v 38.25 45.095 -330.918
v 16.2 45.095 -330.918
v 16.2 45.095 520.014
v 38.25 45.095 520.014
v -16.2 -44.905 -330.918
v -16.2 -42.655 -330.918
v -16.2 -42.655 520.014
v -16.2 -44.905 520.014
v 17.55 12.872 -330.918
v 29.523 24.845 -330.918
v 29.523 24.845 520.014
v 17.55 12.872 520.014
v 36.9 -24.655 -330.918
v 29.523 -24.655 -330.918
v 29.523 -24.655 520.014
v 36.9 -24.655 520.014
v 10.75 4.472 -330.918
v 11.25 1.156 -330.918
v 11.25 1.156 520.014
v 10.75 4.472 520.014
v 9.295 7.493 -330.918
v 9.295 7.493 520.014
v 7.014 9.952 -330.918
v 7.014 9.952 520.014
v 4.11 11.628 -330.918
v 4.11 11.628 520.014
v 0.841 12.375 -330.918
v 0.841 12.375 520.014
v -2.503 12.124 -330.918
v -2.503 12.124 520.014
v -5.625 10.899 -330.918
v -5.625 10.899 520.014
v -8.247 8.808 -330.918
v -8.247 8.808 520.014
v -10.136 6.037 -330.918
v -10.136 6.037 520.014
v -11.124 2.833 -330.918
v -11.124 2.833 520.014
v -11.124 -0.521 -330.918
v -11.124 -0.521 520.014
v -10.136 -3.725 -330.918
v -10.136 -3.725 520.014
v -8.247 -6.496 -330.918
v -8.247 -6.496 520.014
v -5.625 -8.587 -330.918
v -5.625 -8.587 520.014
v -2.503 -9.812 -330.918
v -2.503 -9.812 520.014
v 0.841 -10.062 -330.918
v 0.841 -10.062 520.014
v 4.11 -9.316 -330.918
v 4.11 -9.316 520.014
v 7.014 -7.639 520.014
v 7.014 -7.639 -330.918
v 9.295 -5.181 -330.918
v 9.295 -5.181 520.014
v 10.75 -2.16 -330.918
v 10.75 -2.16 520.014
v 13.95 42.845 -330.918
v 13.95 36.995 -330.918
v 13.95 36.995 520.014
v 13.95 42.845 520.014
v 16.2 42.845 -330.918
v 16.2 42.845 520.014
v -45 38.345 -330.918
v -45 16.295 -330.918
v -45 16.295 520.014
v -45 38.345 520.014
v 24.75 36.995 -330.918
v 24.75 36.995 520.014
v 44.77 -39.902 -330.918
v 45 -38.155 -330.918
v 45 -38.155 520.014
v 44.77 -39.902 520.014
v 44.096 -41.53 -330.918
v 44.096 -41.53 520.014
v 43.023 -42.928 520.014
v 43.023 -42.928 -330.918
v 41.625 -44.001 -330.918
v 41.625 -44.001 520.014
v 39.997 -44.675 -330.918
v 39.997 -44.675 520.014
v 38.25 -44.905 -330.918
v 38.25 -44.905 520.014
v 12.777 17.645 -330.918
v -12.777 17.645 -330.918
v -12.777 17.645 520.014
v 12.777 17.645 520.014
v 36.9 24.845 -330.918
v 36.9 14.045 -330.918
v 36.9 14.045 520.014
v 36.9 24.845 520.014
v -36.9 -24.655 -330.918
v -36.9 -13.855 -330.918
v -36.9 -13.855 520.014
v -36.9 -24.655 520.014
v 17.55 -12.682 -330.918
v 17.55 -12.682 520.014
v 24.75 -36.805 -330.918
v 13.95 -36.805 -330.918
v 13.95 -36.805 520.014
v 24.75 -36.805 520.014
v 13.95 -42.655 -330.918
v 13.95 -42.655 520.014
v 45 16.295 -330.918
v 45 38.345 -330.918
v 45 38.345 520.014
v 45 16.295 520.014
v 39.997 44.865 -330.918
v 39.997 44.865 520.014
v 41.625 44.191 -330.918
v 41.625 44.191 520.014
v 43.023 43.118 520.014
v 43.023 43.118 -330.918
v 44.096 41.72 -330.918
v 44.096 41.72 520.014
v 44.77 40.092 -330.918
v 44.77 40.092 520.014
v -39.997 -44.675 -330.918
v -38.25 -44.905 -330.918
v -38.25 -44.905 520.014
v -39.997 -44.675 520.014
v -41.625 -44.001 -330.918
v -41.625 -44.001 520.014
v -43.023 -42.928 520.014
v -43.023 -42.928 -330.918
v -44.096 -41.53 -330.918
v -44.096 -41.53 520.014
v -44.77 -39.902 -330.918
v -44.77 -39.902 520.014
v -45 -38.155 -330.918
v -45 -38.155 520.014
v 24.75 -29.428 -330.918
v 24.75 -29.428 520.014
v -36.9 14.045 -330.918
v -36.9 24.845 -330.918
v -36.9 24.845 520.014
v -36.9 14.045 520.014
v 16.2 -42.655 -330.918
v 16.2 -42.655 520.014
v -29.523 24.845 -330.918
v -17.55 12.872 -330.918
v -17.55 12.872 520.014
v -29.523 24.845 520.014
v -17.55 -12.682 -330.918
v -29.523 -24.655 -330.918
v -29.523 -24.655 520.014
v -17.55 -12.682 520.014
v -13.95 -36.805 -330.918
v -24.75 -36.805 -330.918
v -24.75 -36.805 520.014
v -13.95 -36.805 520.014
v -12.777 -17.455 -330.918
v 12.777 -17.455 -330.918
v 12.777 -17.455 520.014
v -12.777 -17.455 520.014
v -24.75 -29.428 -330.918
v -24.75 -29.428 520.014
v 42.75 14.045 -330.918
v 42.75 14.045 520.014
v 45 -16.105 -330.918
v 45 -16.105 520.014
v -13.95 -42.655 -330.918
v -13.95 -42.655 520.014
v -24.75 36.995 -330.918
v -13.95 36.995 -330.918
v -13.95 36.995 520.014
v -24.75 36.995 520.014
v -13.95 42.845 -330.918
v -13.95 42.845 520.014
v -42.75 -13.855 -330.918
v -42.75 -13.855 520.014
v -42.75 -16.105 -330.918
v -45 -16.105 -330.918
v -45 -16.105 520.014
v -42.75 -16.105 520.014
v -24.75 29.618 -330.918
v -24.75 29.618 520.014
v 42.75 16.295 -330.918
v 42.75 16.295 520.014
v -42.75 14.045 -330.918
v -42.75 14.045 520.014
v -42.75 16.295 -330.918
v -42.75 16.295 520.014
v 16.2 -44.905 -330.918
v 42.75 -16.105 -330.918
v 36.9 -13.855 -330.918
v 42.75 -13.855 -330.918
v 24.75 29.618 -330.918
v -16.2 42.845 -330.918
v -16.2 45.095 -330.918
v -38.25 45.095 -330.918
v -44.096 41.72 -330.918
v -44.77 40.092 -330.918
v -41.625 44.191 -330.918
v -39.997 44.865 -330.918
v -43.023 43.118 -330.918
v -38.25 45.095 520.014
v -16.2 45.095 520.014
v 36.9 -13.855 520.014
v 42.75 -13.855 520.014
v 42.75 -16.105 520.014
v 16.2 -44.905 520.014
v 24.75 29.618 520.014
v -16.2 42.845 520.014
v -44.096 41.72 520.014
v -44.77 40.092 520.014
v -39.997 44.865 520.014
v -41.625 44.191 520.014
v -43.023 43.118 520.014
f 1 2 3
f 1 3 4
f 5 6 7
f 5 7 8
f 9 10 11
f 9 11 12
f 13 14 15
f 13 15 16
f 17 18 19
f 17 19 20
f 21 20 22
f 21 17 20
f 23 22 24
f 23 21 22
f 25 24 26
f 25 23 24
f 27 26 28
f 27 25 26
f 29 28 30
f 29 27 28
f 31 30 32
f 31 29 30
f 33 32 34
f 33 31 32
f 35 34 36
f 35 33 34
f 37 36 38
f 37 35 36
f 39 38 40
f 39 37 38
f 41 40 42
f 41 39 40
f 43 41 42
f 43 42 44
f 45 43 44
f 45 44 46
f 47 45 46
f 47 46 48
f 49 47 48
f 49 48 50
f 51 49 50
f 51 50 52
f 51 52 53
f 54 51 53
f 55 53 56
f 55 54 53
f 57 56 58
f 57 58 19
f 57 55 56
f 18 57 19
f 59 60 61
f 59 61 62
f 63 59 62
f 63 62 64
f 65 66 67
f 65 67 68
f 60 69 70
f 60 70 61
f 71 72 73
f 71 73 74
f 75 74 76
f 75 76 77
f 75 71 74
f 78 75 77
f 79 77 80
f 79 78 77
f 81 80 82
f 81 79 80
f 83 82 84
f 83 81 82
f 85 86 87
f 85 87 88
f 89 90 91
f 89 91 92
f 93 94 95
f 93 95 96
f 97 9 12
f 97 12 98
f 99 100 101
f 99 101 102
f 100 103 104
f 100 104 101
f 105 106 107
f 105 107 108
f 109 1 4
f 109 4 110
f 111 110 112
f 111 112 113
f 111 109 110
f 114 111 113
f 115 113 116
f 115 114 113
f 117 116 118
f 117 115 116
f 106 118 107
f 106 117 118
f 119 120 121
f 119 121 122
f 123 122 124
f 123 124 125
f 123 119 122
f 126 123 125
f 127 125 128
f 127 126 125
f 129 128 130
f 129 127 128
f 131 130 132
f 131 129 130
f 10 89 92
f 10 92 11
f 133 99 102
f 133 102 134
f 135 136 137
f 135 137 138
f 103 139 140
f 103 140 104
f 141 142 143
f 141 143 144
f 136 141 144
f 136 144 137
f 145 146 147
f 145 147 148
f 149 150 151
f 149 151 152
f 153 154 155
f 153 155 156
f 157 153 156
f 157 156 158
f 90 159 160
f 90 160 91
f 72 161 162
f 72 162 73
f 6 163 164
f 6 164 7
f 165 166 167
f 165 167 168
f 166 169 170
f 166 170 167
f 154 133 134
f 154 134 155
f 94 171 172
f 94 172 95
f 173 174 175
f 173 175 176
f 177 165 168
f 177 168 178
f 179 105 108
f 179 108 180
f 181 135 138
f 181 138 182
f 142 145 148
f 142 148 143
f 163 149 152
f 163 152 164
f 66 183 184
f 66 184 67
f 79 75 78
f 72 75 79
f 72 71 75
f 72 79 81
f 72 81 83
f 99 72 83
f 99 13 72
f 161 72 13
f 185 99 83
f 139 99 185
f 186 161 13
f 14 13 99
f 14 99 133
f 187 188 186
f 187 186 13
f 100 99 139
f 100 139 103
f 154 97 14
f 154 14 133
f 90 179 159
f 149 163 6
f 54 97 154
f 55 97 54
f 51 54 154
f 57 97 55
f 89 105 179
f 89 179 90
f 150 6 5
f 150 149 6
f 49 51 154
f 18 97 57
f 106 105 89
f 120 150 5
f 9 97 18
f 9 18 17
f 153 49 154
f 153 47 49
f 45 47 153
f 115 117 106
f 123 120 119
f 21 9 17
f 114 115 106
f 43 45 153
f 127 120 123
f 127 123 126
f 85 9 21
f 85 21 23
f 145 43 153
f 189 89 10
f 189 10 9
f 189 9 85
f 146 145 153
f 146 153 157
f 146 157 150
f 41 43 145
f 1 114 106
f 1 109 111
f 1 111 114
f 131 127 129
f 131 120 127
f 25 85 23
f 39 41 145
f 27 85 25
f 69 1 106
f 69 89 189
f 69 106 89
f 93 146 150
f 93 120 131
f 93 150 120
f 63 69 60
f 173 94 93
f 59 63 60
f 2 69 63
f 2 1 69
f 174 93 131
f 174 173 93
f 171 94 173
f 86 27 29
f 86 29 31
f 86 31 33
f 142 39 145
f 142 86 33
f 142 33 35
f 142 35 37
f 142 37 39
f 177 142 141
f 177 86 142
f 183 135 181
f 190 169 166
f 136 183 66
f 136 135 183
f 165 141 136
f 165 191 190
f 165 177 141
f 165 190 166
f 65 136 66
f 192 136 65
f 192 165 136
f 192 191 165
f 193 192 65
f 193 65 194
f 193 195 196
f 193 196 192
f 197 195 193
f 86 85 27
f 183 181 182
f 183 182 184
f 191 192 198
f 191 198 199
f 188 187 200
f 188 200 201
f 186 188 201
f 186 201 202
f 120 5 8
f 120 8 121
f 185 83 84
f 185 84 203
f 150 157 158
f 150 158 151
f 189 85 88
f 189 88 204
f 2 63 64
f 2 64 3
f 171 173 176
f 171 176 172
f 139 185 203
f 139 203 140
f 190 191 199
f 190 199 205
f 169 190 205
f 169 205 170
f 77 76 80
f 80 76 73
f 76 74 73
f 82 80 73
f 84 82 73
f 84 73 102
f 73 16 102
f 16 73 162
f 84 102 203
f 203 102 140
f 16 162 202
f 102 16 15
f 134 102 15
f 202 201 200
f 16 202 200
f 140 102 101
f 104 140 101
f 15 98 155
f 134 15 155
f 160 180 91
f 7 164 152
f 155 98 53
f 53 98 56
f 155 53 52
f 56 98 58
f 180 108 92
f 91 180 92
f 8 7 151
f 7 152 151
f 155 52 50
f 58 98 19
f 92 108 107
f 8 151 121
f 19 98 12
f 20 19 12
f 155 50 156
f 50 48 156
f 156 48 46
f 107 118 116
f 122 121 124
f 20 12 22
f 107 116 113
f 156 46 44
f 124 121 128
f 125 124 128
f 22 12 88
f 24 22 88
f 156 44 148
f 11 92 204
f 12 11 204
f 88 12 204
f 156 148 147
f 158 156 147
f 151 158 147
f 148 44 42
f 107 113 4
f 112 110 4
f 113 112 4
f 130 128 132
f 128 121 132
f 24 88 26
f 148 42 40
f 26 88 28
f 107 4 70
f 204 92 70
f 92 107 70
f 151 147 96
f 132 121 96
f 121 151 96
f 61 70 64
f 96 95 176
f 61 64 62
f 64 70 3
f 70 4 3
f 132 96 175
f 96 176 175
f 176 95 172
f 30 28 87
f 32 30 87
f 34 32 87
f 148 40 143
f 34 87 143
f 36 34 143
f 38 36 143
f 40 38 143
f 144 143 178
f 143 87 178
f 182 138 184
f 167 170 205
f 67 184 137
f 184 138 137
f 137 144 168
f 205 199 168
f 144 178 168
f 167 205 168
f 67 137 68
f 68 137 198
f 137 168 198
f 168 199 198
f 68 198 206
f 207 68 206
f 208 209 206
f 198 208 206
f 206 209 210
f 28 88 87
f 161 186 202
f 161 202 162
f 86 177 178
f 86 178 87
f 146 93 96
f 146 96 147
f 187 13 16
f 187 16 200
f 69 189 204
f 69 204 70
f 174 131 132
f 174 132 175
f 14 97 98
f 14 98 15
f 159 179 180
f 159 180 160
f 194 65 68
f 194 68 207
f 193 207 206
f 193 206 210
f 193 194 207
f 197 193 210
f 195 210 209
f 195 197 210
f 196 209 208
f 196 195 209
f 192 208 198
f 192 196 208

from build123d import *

# Parameters (mm, degrees)
SKETCH1_R           = 2.5
BOSS_EXTRUDE1_DEPTH = 189.096108091
SCALE_2_SCALE       = 3
SCALE_3_SCALE       = 6
SCALE_5_SCALE       = 2
SCALE_6_SCALE       = 0.25
SCALE_7_SCALE       = 0.125
SCALE_8_SCALE       = 0.25
SCALE_9_SCALE       = 4
SCALE_10_SCALE      = 4


with BuildPart() as part:
    # Sketch1 → Boss-Extrude1 (new body)
    with BuildSketch(Plane.XY):
        with BuildLine():
            Line((2.839339828, 3.9), (5.5, 6.560660172))
            Line((5.5, 6.560660172), (5.5, 8.2))
            Line((5.5, 8.2), (3.1, 8.2))
            Line((3.1, 8.2), (3.1, 9.5))
            Line((3.1, 9.5), (3.6, 9.5))
            Line((3.6, 9.5), (3.6, 10))
            Line((3.6, 10), (8.5, 10))
            ThreePointArc((8.5, 10), (9.560660172, 9.560660172), (10, 8.5))
            Line((10, 8.5), (10, 3.6))
            Line((10, 3.6), (9.5, 3.6))
            Line((9.5, 3.6), (9.5, 3.1))
            Line((9.5, 3.1), (8.2, 3.1))
            Line((8.2, 3.1), (8.2, 5.5))
            Line((8.2, 5.5), (6.560660172, 5.5))
            Line((6.560660172, 5.5), (3.9, 2.839339828))
            Line((3.9, 2.839339828), (3.9, -2.839339828))
            Line((3.9, -2.839339828), (6.560660172, -5.5))
            Line((6.560660172, -5.5), (8.2, -5.5))
            Line((8.2, -5.5), (8.2, -3.1))
            Line((8.2, -3.1), (9.5, -3.1))
            Line((9.5, -3.1), (9.5, -3.6))
            Line((9.5, -3.6), (10, -3.6))
            Line((10, -3.6), (10, -8.5))
            ThreePointArc((10, -8.5), (9.560660172, -9.560660172), (8.5, -10))
            Line((8.5, -10), (3.6, -10))
            Line((3.6, -10), (3.6, -9.5))
            Line((3.6, -9.5), (3.1, -9.5))
            Line((3.1, -9.5), (3.1, -8.2))
            Line((3.1, -8.2), (5.5, -8.2))
            Line((5.5, -8.2), (5.5, -6.560660172))
            Line((5.5, -6.560660172), (2.839339828, -3.9))
            Line((2.839339828, -3.9), (-2.839339828, -3.9))
            Line((-2.839339828, -3.9), (-5.5, -6.560660172))
            Line((-5.5, -6.560660172), (-5.5, -8.2))
            Line((-5.5, -8.2), (-3.1, -8.2))
            Line((-3.1, -8.2), (-3.1, -9.5))
            Line((-3.1, -9.5), (-3.6, -9.5))
            Line((-3.6, -9.5), (-3.6, -10))
            Line((-3.6, -10), (-8.5, -10))
            ThreePointArc((-8.5, -10), (-9.560660172, -9.560660172), (-10, -8.5))
            Line((-10, -8.5), (-10, -3.6))
            Line((-10, -3.6), (-9.5, -3.6))
            Line((-9.5, -3.6), (-9.5, -3.1))
            Line((-9.5, -3.1), (-8.2, -3.1))
            Line((-8.2, -3.1), (-8.2, -5.5))
            Line((-8.2, -5.5), (-6.560660172, -5.5))
            Line((-6.560660172, -5.5), (-3.9, -2.839339828))
            Line((-3.9, -2.839339828), (-3.9, 2.839339828))
            Line((-3.9, 2.839339828), (-6.560660172, 5.5))
            Line((-6.560660172, 5.5), (-8.2, 5.5))
            Line((-8.2, 5.5), (-8.2, 3.1))
            Line((-8.2, 3.1), (-9.5, 3.1))
            Line((-9.5, 3.1), (-9.5, 3.6))
            Line((-9.5, 3.6), (-10, 3.6))
            Line((-10, 3.6), (-10, 8.5))
            ThreePointArc((-10, 8.5), (-9.560660172, 9.560660172), (-8.5, 10))
            Line((-8.5, 10), (-3.6, 10))
            Line((-3.6, 10), (-3.6, 9.5))
            Line((-3.6, 9.5), (-3.1, 9.5))
            Line((-3.1, 9.5), (-3.1, 8.2))
            Line((-3.1, 8.2), (-5.5, 8.2))
            Line((-5.5, 8.2), (-5.5, 6.560660172))
            Line((-5.5, 6.560660172), (-2.839339828, 3.9))
            Line((-2.839339828, 3.9), (2.839339828, 3.9))
        make_face()
        with Locations((0, 0.235847297)):
            Circle(SKETCH1_R, mode=Mode.SUBTRACT)
    extrude(amount=BOSS_EXTRUDE1_DEPTH)


with BuildPart() as part_1:
    # 缩放比例2: scaled about (0, -0.027095247, 94.548054046)
    add(part.part.scale(SCALE_2_SCALE).moved(Location((0, 0.054190494, -189.096108092))))


with BuildPart() as part_2:
    # 缩放比例3: scaled about (0, -0.027095247, 94.548054045)
    add(part_1.part.scale(SCALE_3_SCALE).moved(Location((0, 0.135476235, -472.740270225))))


with BuildPart() as part_3:
    # 缩放比例5: scaled about (0, -0.027095249, 94.548054043)
    add(part_2.part.scale(SCALE_5_SCALE).moved(Location((0, 0.027095249, -94.548054043))))


with BuildPart() as part_4:
    # 缩放比例6: scaled about (0, -0.027095249, 94.548054044)
    add(part_3.part.scale(SCALE_6_SCALE).moved(Location((0, -0.020321437, 70.911040533))))


with BuildPart() as part_5:
    # 缩放比例7: scaled about (0, -0.027095249, 94.548054044)
    add(part_4.part.scale(SCALE_7_SCALE).moved(Location((0, -0.023708343, 82.729547289))))


with BuildPart() as part_6:
    # 缩放比例8: scaled about (0, -0.027095249, 94.548054044)
    add(part_5.part.scale(SCALE_8_SCALE).moved(Location((0, -0.020321437, 70.911040533))))


with BuildPart() as part_7:
    # 缩放比例9: scaled about (0, -0.027095249, 94.548054044)
    add(part_6.part.scale(SCALE_9_SCALE).moved(Location((0, 0.081285747, -283.644162132))))


with BuildPart() as part_8:
    # 缩放比例10: scaled about (0, -0.027095249, 94.548054044)
    add(part_7.part.scale(SCALE_10_SCALE).moved(Location((0, 0.081285747, -283.644162132))))


solid = part_8.part
